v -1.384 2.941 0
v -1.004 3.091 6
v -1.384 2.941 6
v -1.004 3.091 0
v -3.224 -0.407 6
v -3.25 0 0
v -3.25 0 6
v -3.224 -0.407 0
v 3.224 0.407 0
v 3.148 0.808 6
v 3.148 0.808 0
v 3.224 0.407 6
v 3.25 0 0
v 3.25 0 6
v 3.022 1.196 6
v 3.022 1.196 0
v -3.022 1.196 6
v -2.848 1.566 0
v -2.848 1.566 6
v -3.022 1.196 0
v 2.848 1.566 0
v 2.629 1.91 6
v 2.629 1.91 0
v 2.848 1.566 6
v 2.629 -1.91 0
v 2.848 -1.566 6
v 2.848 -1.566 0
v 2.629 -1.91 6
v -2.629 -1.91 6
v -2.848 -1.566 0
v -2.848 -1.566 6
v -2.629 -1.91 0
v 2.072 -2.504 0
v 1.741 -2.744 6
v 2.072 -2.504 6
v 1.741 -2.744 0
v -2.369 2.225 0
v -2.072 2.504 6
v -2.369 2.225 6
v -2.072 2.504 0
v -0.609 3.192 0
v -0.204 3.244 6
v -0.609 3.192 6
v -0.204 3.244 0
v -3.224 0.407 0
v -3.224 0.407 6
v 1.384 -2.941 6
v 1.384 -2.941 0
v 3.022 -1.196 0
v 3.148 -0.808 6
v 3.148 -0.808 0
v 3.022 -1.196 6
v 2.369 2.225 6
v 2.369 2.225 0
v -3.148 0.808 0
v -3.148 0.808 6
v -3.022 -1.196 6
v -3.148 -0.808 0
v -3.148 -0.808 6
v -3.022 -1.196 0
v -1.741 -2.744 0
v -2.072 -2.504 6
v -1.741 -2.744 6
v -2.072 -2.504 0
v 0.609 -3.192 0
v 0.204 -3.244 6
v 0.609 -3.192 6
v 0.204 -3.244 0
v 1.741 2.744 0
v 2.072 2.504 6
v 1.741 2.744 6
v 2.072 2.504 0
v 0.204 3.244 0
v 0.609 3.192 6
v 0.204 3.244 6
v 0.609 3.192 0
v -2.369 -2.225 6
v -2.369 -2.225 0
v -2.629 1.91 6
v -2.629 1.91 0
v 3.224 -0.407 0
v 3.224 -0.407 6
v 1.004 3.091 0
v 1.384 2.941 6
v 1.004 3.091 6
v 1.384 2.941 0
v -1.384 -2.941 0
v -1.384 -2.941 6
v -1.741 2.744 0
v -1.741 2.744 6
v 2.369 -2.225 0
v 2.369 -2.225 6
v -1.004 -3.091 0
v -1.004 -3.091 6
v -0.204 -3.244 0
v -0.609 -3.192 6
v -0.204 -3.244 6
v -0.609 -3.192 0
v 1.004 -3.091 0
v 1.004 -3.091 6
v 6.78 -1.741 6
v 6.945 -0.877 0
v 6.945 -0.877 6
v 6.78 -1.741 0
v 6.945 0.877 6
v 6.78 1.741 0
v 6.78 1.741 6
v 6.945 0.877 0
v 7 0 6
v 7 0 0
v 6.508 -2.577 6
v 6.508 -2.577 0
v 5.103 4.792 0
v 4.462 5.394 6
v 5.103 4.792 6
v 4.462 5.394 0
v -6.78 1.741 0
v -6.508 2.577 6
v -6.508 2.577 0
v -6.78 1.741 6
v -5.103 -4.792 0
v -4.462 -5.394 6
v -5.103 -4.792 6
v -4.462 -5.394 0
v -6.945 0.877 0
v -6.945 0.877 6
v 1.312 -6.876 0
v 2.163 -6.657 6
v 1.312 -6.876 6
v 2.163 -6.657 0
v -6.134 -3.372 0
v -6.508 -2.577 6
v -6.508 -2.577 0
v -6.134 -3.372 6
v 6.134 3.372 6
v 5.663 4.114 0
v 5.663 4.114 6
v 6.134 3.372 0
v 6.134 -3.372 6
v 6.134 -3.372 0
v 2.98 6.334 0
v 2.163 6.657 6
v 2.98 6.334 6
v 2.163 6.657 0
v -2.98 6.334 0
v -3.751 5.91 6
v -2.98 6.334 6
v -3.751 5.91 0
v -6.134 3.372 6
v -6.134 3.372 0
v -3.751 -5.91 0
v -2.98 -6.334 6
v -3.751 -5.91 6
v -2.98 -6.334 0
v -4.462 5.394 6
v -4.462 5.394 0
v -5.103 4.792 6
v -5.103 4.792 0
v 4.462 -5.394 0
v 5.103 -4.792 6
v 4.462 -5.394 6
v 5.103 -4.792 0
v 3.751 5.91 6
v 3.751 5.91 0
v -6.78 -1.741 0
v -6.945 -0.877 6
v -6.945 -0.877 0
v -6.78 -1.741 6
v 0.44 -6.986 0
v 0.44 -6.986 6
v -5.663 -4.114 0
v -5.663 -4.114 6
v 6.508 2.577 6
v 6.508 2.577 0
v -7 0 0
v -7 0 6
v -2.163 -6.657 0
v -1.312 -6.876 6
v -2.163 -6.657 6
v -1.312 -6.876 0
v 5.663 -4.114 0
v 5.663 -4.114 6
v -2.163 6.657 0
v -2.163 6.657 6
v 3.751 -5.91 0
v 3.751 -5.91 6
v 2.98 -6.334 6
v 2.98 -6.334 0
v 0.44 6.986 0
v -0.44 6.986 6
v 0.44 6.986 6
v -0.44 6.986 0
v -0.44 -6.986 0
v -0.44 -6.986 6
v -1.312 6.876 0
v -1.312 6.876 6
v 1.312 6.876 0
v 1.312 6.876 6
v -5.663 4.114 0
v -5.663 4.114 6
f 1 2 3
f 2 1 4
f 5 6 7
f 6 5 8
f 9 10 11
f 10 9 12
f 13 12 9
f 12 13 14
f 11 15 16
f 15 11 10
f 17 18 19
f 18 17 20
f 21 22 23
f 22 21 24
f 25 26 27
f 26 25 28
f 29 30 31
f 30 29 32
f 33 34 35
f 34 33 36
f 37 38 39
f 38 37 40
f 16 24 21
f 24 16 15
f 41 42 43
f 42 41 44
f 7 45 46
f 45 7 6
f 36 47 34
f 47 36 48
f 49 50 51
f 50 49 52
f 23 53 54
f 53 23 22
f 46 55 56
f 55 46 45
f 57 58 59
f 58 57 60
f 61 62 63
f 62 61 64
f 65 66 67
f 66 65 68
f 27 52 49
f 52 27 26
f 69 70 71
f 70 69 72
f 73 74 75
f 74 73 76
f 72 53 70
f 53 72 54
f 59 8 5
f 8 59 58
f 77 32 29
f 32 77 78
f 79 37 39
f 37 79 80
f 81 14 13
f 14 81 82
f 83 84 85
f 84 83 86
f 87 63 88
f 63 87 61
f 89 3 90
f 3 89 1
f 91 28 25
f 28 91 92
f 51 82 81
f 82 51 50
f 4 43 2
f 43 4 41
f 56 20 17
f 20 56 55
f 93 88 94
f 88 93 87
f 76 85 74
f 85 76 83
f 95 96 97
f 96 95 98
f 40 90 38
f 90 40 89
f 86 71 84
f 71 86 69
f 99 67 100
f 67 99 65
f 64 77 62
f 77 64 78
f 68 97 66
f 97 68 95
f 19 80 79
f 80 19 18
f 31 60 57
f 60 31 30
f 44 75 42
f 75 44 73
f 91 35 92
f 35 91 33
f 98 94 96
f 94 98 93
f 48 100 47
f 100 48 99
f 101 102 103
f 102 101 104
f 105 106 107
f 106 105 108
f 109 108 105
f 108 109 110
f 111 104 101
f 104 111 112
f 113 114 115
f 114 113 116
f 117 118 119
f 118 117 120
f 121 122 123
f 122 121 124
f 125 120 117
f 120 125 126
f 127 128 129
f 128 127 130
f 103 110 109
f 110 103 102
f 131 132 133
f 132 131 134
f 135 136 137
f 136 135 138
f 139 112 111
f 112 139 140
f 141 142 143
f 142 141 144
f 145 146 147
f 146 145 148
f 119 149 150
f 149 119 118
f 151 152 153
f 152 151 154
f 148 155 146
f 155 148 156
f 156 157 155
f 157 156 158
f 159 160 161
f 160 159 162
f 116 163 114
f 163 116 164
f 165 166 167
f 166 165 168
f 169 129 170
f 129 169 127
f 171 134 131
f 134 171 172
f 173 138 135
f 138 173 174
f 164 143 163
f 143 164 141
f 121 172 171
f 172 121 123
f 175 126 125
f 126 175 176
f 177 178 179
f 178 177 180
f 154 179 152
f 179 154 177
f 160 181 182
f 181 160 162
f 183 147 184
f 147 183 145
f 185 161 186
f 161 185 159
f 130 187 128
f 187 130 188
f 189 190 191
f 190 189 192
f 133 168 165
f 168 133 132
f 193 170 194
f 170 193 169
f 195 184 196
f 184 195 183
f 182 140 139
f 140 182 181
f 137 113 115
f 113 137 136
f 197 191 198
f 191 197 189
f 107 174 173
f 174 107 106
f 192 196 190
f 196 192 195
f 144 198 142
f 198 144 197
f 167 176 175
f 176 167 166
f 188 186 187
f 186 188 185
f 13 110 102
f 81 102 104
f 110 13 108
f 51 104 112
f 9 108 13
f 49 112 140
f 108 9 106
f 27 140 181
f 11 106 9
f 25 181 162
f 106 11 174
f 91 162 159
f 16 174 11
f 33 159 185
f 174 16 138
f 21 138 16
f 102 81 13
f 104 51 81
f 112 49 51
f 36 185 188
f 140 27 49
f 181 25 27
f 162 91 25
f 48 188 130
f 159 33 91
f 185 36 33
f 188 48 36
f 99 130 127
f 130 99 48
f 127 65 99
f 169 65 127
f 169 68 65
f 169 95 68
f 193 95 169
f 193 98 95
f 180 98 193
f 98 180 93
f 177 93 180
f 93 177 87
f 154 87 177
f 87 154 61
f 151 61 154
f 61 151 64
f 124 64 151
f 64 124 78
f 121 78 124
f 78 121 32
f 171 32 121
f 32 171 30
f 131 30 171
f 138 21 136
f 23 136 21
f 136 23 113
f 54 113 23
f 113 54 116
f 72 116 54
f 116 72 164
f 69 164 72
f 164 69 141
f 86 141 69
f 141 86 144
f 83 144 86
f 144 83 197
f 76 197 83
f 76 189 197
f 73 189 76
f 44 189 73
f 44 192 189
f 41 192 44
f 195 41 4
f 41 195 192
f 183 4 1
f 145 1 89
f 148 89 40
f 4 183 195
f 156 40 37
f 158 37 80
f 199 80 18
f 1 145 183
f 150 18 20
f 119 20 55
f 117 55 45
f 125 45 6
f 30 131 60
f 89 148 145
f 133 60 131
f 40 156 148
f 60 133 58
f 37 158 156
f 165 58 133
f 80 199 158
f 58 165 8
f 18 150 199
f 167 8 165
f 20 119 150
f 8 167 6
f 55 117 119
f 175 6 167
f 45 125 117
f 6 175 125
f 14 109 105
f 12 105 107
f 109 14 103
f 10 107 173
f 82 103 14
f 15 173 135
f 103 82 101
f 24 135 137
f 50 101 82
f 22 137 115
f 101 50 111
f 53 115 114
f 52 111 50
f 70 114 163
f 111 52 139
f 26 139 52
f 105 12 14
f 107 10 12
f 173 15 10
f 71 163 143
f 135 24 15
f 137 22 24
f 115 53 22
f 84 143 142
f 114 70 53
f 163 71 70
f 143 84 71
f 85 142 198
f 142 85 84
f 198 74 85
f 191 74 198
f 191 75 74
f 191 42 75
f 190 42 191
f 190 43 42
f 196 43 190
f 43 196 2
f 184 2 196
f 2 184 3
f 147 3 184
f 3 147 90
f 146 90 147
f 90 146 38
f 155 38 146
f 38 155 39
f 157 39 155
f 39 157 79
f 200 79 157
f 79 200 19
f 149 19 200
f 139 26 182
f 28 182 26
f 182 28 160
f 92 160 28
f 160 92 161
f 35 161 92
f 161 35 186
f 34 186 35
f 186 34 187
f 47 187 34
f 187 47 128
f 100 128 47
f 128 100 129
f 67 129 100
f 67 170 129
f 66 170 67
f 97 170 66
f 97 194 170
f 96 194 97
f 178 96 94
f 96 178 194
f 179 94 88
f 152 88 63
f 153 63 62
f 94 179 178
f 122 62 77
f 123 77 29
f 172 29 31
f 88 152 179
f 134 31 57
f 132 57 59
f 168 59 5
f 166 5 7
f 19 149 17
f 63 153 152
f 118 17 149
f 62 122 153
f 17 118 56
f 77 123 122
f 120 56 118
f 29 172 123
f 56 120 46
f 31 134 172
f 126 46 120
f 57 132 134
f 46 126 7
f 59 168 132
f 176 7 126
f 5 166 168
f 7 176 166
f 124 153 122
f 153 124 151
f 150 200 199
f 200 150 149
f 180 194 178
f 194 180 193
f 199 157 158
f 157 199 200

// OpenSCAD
$fn = 50;


difference() {
	union() {
		cylinder(h = 6, r = 7.0000000000);
	}
	union() {
		translate(v = [0.0000000000, 0.0000000000, -100.0000000000]) {
			cylinder(h = 200, r = 3.2500000000);
		}
		cylinder(h = 6, r = 1.8000000000);
		cylinder(h = 6, r = 1.8000000000);
		cylinder(h = 6, r = 1.8000000000);
	}
}
